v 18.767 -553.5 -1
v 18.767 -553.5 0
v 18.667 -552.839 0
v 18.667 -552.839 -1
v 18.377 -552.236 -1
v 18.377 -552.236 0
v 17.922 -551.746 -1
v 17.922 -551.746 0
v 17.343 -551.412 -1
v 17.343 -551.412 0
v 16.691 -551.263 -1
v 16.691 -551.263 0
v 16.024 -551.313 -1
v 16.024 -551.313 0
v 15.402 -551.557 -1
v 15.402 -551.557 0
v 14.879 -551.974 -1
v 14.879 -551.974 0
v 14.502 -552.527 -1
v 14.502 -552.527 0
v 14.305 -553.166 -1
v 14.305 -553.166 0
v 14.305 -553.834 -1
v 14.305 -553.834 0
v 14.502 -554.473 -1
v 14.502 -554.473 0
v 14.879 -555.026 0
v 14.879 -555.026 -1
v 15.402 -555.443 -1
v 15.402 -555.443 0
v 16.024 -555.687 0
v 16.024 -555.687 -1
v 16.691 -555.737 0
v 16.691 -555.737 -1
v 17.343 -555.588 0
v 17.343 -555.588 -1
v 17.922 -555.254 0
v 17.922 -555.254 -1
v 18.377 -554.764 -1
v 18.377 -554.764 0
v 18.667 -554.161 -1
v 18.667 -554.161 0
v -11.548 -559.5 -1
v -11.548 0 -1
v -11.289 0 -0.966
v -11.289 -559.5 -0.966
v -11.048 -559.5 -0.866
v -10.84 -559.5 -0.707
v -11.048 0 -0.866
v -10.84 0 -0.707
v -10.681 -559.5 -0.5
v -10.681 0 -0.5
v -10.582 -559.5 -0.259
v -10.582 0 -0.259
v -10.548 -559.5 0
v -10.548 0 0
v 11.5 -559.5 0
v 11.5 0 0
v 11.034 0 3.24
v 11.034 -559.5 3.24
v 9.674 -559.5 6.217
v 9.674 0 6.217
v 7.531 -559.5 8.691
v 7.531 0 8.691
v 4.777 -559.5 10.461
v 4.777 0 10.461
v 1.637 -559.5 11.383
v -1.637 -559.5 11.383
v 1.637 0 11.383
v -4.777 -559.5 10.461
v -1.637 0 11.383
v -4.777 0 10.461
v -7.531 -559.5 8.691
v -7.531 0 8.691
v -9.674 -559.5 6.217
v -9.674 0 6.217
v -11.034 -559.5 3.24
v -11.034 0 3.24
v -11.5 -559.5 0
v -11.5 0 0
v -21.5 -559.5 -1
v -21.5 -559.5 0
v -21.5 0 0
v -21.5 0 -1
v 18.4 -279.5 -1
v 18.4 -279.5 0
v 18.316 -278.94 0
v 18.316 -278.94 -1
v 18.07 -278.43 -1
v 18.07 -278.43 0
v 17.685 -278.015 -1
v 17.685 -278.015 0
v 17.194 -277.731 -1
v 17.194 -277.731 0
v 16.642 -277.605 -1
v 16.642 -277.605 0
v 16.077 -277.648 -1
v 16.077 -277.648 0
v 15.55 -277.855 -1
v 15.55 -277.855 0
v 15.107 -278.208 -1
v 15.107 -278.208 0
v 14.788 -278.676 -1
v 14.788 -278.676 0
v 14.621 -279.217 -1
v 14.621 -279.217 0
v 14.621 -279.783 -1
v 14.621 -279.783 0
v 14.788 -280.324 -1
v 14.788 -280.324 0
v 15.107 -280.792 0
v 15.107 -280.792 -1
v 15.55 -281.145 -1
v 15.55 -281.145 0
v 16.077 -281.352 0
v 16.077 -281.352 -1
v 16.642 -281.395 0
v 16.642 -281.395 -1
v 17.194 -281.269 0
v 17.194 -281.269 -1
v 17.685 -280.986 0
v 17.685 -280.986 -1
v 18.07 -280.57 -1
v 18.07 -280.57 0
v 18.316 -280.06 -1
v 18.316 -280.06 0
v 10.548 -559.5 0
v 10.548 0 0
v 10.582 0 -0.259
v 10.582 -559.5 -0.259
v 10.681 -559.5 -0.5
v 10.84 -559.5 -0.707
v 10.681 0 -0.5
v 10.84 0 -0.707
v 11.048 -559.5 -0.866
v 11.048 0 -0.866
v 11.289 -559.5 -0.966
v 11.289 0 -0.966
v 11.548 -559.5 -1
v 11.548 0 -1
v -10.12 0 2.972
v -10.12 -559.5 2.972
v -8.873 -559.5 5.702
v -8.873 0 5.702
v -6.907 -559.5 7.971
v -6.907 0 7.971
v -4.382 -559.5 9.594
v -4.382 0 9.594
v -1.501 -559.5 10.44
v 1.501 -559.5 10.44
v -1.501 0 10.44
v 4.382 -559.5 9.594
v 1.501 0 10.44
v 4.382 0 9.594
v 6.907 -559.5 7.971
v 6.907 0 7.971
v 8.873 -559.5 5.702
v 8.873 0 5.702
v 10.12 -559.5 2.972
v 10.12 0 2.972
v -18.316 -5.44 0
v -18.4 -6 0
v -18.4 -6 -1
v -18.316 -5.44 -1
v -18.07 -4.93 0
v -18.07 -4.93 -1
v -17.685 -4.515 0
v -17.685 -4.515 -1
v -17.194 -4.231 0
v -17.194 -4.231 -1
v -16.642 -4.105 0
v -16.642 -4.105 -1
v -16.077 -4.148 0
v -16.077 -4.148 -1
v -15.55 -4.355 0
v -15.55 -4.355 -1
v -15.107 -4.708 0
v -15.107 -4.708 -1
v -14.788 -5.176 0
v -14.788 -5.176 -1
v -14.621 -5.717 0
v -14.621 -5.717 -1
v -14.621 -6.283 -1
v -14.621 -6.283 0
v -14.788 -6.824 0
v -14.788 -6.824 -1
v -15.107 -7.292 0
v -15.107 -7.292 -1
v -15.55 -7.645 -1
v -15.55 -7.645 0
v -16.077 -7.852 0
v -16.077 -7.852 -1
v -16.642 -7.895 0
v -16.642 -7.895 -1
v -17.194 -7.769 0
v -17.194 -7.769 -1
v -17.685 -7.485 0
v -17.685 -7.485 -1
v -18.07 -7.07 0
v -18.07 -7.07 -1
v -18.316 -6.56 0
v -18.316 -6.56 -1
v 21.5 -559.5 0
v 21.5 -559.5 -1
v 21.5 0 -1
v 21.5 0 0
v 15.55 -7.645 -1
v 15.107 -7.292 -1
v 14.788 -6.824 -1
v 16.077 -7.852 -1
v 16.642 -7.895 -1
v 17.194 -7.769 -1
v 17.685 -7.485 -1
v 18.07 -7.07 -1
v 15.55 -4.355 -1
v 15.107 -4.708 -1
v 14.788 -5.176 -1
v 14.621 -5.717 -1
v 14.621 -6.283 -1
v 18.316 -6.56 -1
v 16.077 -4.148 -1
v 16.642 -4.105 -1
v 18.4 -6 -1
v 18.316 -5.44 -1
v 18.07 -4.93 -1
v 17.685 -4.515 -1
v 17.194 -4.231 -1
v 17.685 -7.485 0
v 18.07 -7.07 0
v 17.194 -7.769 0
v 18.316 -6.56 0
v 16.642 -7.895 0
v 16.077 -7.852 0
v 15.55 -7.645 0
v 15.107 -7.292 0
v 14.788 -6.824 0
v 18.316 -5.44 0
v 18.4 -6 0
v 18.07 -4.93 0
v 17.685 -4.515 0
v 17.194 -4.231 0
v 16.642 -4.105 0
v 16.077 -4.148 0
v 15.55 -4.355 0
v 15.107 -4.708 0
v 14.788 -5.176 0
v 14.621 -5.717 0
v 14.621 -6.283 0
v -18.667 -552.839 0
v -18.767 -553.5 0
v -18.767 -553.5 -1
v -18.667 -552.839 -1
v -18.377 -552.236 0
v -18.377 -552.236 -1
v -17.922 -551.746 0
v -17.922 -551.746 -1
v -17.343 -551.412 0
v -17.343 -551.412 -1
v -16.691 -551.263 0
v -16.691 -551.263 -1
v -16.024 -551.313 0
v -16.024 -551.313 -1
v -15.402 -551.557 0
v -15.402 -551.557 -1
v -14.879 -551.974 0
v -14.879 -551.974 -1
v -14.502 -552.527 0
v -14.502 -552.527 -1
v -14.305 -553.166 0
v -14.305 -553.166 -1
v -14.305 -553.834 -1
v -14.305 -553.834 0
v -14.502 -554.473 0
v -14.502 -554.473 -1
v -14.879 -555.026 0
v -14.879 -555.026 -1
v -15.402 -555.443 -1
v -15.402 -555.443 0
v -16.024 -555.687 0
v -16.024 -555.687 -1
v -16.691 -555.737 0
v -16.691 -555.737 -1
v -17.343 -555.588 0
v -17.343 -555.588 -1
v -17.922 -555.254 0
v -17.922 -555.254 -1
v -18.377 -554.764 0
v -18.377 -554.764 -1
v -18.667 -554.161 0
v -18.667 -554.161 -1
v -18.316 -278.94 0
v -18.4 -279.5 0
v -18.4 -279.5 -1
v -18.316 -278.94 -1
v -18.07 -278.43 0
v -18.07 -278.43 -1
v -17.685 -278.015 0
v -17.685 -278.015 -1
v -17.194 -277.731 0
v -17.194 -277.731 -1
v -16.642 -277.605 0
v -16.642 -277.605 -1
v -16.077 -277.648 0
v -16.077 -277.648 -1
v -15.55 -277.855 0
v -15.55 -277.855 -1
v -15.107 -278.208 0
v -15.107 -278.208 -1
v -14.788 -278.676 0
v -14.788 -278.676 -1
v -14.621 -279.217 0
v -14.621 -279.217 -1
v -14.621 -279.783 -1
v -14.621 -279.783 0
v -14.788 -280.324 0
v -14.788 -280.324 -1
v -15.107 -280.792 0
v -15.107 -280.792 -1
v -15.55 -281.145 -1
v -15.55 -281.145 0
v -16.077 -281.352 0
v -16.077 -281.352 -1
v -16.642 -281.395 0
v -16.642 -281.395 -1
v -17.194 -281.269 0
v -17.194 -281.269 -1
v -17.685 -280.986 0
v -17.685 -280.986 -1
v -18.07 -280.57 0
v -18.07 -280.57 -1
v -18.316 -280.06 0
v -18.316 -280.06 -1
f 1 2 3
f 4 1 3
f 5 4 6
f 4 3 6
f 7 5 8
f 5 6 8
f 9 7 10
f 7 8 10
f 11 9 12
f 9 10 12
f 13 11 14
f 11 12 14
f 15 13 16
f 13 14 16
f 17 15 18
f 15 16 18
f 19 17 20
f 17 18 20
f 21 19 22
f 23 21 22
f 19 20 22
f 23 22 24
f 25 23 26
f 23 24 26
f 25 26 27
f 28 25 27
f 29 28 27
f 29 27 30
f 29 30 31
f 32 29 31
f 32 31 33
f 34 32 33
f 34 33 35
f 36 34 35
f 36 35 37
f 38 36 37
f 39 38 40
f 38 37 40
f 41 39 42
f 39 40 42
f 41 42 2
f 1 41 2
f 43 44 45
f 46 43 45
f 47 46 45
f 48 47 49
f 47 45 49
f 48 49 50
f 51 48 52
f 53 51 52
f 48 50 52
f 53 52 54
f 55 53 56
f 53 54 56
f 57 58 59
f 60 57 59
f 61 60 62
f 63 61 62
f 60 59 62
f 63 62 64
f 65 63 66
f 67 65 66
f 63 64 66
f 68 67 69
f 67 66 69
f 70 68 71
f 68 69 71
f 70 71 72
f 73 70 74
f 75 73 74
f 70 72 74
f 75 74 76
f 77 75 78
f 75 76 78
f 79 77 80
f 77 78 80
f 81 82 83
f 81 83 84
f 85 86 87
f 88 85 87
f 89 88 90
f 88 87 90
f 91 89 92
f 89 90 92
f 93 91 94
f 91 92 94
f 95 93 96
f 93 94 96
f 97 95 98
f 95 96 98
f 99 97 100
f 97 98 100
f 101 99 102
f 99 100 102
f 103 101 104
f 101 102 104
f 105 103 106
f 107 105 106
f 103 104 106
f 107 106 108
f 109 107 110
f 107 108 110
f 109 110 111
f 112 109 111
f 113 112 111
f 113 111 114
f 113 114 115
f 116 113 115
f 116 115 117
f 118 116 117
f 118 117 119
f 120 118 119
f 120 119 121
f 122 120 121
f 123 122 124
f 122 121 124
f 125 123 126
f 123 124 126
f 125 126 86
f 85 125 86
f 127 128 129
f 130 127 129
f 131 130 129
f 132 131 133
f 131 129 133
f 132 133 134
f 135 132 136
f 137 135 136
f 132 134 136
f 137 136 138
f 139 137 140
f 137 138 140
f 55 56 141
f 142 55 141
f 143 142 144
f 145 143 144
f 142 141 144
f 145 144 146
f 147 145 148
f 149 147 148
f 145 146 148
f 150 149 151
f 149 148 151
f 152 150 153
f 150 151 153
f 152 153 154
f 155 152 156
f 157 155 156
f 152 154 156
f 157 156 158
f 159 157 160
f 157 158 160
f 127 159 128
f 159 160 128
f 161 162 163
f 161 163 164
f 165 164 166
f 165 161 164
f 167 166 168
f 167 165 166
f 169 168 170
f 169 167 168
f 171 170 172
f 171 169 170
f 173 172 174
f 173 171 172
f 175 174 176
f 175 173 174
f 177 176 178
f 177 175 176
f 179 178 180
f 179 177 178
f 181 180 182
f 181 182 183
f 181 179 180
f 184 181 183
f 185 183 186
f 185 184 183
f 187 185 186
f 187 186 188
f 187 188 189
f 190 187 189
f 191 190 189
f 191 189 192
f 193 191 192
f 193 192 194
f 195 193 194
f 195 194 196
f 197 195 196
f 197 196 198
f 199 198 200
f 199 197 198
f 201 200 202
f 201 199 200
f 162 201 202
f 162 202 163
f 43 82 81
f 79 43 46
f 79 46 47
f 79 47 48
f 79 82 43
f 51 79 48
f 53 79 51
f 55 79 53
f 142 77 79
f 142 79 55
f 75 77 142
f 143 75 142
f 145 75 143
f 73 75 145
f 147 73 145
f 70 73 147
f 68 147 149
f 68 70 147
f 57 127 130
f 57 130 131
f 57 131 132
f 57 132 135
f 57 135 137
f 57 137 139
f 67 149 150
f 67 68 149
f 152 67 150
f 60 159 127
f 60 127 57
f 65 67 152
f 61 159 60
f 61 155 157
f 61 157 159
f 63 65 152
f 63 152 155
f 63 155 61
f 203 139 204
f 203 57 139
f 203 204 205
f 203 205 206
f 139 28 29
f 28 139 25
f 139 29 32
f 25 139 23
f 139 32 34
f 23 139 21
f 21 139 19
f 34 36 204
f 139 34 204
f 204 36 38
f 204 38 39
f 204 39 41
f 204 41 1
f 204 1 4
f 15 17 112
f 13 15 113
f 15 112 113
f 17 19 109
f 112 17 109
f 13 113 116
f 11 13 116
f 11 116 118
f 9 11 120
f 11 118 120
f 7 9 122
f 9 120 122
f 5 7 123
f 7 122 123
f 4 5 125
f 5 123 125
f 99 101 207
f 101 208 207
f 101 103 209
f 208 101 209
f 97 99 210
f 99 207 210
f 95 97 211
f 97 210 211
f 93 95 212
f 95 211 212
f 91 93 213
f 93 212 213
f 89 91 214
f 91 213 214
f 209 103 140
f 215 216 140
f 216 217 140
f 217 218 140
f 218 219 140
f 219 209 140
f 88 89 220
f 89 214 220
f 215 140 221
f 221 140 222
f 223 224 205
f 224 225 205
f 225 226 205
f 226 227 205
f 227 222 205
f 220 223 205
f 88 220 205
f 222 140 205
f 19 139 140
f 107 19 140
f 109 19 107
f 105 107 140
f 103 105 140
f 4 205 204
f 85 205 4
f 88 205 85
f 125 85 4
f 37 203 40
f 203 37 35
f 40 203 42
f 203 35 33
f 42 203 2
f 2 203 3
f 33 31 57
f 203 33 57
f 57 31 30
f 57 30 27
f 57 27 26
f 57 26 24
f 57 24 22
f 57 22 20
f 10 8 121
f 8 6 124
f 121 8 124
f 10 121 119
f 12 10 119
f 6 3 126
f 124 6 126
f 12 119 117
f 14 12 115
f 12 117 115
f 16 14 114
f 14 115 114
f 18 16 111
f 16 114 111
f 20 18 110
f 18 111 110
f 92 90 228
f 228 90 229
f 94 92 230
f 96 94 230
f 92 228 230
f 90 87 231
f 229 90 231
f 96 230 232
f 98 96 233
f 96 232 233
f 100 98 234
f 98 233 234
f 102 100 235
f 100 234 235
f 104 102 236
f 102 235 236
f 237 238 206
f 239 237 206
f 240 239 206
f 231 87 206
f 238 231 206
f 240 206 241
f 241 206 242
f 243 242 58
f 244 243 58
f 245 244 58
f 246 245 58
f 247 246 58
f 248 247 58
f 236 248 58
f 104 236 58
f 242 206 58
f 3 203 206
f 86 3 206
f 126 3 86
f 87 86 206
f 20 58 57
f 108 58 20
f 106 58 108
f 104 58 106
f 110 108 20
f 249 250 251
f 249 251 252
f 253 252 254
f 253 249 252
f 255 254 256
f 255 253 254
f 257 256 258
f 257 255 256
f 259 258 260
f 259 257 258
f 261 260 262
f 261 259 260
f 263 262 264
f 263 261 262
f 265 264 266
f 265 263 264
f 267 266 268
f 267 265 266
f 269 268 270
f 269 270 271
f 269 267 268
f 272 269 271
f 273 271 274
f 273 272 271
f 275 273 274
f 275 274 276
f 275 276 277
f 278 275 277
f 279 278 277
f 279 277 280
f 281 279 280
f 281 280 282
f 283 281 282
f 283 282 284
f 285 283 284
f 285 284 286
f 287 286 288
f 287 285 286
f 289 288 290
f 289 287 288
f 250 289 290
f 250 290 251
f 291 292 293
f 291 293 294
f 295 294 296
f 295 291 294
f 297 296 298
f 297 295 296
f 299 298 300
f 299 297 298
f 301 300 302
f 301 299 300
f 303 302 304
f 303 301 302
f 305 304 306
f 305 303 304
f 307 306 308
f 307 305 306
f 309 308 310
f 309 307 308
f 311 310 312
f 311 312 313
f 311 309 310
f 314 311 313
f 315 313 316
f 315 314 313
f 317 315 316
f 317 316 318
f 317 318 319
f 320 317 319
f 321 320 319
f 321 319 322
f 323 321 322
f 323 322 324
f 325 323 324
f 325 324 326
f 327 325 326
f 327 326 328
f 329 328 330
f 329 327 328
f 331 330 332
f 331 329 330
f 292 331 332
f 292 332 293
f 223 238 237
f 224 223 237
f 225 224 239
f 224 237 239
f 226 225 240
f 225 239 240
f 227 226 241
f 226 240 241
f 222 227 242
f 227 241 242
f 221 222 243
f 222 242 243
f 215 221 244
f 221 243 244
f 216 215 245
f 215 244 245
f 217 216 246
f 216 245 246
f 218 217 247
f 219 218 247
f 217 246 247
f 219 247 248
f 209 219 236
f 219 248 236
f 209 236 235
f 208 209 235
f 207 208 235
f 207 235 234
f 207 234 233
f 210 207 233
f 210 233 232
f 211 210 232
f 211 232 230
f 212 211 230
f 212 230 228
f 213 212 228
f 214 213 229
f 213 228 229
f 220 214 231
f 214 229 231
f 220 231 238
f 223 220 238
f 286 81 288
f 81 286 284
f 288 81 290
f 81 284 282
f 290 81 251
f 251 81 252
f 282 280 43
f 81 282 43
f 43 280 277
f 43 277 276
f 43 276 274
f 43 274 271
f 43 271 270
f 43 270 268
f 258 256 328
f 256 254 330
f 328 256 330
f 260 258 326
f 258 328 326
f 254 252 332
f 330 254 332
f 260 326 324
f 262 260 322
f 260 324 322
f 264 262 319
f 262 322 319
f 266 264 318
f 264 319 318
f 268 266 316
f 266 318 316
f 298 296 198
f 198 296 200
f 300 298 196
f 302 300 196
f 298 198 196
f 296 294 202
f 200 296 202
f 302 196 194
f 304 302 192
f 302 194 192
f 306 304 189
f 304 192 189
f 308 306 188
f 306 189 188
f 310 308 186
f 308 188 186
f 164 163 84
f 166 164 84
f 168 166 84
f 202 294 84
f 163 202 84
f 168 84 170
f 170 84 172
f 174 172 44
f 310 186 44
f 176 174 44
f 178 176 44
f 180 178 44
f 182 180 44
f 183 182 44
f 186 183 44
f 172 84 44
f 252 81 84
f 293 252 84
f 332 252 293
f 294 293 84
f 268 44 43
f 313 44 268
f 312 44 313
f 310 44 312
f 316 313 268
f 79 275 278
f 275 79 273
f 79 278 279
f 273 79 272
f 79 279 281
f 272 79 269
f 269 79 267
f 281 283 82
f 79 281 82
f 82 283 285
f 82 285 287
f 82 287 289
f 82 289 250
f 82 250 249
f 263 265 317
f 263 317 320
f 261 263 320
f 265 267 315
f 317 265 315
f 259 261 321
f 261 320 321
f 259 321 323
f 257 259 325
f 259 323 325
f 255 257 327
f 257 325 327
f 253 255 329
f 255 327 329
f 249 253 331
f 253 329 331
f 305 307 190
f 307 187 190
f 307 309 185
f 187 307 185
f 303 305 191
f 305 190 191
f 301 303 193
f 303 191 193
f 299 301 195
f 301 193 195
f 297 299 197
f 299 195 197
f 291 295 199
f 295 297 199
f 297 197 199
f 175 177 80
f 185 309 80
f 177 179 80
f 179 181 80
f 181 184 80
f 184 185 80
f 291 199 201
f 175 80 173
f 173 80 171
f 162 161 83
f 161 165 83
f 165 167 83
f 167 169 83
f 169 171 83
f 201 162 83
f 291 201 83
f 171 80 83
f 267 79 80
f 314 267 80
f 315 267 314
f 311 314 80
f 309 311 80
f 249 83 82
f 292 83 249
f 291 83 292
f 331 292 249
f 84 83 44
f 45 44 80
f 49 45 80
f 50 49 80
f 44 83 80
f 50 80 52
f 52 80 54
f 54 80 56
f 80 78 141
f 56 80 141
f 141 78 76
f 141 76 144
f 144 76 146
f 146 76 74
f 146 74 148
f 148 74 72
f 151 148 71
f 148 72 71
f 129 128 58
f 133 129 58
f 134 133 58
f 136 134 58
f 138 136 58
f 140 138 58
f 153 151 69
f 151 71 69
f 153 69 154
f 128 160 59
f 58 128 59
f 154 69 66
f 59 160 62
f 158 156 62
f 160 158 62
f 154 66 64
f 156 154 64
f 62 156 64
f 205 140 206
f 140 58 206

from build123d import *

# Parameters (mm, degrees)
F1_DEPTH = 559.5
F2_R     = 1.9
F2_R_2   = 2.2432813823
F3_DEPTH = 1


# Not quite as in the source:
# - a pattern or mirror of a feature is missing from the dataset's text; its kind, count and spacing are read off the source's solid
# - a feature names something its author has since deleted; it is built from what else it names


with BuildPart() as f1:
    # F0 (on Front) → F1 (new body)
    with BuildSketch(Plane.XZ):
        with BuildLine():
            Line((-21.5, 0), (-21.5, -1))
            Line((-21.5, -1), (-11.5475115549, -1))
            ThreePointArc((-11.5475115549, -1), (-10.8404047737, -0.7071067812), (-10.5475115549, 0))
            ThreePointArc((-10.5475115549, 0), (0, 10.5475115549), (10.5475115549, 0))
            ThreePointArc((10.5475115549, 0), (10.8404047737, -0.7071067812), (11.5475115549, -1))
            Line((11.5475115549, -1), (21.5, -1))
            Line((21.5, -1), (21.5, 0))
            Line((21.5, 0), (11.5, 0))
            ThreePointArc((11.5, 0), (0, 11.5), (-11.5, 0))
            Line((-11.5, 0), (-21.5, 0))
        make_face()
    extrude(amount=F1_DEPTH)

    # F2 (on face) → F3 (cut, through all)
    with BuildSketch(Plane.XY):
        with Locations((16.5, -279.50005)):
            Circle(F2_R)
        with Locations((16.5, -6)):
            Circle(F2_R)
        with Locations((16.5236079696, -553.5000464449)):
            Circle(F2_R_2)
    f3 = extrude(amount=-F3_DEPTH, mode=Mode.SUBTRACT)

    # F3_copies: F3 across plane
    add(f3.mirror(Plane(origin=(0, 0, 0), x_dir=(0, 0, -1), z_dir=(-1, 0, 0))), mode=Mode.SUBTRACT)


solid = f1.part
